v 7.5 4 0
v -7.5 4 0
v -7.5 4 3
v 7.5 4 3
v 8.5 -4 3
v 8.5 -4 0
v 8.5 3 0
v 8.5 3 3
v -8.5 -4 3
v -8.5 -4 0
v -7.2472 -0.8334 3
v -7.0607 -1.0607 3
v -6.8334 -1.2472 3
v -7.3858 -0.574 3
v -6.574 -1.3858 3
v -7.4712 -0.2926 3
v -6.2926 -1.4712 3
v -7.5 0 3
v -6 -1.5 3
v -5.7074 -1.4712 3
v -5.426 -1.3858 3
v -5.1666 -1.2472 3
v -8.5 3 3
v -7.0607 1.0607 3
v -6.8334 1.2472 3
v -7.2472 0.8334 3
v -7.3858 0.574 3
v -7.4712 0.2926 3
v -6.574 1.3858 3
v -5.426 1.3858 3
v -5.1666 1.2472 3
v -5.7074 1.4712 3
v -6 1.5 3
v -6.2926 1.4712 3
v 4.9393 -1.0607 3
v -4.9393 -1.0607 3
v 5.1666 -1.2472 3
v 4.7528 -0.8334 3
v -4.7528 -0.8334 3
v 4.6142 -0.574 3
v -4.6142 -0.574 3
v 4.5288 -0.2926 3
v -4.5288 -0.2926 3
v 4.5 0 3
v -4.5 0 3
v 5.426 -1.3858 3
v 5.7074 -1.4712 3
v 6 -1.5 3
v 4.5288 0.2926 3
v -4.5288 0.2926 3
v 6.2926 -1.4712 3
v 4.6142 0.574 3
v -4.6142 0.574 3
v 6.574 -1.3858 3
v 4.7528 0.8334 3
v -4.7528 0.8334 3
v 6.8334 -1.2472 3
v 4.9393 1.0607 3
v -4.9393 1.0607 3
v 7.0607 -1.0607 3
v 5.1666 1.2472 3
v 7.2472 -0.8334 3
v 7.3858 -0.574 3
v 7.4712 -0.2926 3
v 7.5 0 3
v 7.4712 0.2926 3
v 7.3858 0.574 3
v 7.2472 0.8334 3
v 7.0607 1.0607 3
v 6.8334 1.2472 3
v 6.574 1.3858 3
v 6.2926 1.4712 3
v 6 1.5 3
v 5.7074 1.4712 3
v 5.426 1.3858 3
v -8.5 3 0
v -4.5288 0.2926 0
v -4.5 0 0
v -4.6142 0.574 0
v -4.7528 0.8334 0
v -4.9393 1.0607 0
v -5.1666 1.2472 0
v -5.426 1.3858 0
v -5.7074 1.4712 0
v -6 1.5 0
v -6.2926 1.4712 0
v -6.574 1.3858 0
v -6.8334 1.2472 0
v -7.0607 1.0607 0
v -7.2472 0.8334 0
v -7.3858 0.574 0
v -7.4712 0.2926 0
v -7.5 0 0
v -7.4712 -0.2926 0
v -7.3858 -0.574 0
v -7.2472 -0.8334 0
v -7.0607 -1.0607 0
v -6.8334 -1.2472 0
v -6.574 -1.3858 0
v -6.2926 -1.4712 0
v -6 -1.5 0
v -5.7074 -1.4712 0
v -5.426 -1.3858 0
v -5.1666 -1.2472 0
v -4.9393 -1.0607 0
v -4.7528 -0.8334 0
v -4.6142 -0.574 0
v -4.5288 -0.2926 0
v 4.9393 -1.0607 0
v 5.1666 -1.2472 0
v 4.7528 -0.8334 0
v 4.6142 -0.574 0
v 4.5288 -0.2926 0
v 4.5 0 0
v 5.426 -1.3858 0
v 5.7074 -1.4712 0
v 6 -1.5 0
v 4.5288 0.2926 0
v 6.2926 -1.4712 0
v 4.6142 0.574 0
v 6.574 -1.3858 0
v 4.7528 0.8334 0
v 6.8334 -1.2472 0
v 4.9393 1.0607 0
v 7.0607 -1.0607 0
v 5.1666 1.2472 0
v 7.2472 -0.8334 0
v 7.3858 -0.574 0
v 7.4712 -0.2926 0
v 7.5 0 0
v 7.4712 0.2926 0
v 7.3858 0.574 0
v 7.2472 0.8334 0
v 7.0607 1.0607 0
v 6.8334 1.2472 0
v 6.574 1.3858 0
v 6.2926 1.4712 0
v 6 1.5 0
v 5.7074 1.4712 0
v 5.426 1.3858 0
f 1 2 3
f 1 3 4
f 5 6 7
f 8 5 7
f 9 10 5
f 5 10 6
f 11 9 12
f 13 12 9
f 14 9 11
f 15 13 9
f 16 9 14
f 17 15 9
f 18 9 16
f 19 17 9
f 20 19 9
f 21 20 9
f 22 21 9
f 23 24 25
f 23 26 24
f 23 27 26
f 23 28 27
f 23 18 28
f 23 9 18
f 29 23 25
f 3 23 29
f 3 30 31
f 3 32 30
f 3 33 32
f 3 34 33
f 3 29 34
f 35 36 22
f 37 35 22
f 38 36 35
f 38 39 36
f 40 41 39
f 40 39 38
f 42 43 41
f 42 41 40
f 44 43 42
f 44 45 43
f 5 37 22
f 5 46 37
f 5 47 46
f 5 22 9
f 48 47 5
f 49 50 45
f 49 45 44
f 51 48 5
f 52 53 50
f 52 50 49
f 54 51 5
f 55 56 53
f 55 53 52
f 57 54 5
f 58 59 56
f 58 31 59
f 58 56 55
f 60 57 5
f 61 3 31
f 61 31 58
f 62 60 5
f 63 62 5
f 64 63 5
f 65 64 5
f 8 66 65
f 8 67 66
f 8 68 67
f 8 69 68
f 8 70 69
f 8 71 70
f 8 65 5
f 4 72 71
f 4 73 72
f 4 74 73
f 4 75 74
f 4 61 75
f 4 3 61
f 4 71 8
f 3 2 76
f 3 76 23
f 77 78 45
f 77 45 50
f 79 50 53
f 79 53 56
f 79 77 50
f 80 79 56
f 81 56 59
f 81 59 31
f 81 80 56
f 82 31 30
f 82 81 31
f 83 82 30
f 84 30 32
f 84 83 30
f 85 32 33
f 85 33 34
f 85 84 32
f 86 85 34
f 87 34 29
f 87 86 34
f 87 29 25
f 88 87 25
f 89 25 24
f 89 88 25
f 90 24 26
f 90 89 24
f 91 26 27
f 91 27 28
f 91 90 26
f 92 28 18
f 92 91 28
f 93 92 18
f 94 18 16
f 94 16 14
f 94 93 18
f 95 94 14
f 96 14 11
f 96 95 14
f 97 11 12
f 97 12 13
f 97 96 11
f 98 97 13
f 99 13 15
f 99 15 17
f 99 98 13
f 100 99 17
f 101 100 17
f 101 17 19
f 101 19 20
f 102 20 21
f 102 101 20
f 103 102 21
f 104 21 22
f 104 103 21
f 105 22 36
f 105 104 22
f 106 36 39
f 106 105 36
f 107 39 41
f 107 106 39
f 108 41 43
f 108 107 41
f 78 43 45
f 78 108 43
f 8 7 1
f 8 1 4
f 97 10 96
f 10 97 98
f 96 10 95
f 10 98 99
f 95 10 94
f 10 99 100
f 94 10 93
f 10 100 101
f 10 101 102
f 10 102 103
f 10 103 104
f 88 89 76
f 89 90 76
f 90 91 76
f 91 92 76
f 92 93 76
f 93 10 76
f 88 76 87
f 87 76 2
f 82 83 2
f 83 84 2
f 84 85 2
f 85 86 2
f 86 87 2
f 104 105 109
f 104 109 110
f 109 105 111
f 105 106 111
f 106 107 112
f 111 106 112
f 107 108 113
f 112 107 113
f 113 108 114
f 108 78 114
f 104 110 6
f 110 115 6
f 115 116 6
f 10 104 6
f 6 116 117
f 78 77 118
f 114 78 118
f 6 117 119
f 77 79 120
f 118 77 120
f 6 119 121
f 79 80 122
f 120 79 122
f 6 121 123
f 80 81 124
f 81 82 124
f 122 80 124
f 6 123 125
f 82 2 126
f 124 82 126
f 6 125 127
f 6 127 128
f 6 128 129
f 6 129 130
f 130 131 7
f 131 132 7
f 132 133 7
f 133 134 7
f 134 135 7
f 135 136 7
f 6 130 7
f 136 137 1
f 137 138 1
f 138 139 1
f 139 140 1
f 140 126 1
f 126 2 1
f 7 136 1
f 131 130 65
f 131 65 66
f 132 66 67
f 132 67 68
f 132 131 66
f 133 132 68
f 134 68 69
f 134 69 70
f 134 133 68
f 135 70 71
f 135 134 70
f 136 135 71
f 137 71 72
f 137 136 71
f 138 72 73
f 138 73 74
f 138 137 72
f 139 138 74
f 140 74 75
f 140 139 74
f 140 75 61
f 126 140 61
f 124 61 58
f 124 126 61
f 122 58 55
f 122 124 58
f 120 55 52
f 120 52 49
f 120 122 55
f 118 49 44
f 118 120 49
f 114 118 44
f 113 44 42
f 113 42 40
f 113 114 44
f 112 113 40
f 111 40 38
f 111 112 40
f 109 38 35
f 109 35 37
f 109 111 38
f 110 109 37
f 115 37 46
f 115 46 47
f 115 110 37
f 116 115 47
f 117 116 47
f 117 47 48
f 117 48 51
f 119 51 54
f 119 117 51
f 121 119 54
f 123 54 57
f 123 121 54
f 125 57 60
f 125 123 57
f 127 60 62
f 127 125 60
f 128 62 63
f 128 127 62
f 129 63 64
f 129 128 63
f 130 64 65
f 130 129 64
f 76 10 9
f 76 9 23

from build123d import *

# Parameters (mm, degrees)
ESQUISSE1_W        = 17
ESQUISSE1_H        = 8
ESQUISSE1_R        = 1.5
BOSS_EXTRU_1_DEPTH = 3
CHANFREIN1_SIZE    = 1


with BuildPart() as part:
    # Esquisse1 → Boss.-Extru.1 (new body)
    with BuildSketch(Plane.XY):
        Rectangle(ESQUISSE1_W, ESQUISSE1_H)
        with Locations((-6, 0)):
            Circle(ESQUISSE1_R, mode=Mode.SUBTRACT)
        with Locations((6, 0)):
            Circle(ESQUISSE1_R, mode=Mode.SUBTRACT)
    extrude(amount=BOSS_EXTRU_1_DEPTH)

    # Chanfrein1
    chanfrein1_edges = [part.edges().sort_by_distance(p)[0] for p in [
        (-8.5, 4, 1.5),
        (8.5, 4, 1.5),
    ]]
    chamfer(chanfrein1_edges, length=CHANFREIN1_SIZE)


solid = part.part
